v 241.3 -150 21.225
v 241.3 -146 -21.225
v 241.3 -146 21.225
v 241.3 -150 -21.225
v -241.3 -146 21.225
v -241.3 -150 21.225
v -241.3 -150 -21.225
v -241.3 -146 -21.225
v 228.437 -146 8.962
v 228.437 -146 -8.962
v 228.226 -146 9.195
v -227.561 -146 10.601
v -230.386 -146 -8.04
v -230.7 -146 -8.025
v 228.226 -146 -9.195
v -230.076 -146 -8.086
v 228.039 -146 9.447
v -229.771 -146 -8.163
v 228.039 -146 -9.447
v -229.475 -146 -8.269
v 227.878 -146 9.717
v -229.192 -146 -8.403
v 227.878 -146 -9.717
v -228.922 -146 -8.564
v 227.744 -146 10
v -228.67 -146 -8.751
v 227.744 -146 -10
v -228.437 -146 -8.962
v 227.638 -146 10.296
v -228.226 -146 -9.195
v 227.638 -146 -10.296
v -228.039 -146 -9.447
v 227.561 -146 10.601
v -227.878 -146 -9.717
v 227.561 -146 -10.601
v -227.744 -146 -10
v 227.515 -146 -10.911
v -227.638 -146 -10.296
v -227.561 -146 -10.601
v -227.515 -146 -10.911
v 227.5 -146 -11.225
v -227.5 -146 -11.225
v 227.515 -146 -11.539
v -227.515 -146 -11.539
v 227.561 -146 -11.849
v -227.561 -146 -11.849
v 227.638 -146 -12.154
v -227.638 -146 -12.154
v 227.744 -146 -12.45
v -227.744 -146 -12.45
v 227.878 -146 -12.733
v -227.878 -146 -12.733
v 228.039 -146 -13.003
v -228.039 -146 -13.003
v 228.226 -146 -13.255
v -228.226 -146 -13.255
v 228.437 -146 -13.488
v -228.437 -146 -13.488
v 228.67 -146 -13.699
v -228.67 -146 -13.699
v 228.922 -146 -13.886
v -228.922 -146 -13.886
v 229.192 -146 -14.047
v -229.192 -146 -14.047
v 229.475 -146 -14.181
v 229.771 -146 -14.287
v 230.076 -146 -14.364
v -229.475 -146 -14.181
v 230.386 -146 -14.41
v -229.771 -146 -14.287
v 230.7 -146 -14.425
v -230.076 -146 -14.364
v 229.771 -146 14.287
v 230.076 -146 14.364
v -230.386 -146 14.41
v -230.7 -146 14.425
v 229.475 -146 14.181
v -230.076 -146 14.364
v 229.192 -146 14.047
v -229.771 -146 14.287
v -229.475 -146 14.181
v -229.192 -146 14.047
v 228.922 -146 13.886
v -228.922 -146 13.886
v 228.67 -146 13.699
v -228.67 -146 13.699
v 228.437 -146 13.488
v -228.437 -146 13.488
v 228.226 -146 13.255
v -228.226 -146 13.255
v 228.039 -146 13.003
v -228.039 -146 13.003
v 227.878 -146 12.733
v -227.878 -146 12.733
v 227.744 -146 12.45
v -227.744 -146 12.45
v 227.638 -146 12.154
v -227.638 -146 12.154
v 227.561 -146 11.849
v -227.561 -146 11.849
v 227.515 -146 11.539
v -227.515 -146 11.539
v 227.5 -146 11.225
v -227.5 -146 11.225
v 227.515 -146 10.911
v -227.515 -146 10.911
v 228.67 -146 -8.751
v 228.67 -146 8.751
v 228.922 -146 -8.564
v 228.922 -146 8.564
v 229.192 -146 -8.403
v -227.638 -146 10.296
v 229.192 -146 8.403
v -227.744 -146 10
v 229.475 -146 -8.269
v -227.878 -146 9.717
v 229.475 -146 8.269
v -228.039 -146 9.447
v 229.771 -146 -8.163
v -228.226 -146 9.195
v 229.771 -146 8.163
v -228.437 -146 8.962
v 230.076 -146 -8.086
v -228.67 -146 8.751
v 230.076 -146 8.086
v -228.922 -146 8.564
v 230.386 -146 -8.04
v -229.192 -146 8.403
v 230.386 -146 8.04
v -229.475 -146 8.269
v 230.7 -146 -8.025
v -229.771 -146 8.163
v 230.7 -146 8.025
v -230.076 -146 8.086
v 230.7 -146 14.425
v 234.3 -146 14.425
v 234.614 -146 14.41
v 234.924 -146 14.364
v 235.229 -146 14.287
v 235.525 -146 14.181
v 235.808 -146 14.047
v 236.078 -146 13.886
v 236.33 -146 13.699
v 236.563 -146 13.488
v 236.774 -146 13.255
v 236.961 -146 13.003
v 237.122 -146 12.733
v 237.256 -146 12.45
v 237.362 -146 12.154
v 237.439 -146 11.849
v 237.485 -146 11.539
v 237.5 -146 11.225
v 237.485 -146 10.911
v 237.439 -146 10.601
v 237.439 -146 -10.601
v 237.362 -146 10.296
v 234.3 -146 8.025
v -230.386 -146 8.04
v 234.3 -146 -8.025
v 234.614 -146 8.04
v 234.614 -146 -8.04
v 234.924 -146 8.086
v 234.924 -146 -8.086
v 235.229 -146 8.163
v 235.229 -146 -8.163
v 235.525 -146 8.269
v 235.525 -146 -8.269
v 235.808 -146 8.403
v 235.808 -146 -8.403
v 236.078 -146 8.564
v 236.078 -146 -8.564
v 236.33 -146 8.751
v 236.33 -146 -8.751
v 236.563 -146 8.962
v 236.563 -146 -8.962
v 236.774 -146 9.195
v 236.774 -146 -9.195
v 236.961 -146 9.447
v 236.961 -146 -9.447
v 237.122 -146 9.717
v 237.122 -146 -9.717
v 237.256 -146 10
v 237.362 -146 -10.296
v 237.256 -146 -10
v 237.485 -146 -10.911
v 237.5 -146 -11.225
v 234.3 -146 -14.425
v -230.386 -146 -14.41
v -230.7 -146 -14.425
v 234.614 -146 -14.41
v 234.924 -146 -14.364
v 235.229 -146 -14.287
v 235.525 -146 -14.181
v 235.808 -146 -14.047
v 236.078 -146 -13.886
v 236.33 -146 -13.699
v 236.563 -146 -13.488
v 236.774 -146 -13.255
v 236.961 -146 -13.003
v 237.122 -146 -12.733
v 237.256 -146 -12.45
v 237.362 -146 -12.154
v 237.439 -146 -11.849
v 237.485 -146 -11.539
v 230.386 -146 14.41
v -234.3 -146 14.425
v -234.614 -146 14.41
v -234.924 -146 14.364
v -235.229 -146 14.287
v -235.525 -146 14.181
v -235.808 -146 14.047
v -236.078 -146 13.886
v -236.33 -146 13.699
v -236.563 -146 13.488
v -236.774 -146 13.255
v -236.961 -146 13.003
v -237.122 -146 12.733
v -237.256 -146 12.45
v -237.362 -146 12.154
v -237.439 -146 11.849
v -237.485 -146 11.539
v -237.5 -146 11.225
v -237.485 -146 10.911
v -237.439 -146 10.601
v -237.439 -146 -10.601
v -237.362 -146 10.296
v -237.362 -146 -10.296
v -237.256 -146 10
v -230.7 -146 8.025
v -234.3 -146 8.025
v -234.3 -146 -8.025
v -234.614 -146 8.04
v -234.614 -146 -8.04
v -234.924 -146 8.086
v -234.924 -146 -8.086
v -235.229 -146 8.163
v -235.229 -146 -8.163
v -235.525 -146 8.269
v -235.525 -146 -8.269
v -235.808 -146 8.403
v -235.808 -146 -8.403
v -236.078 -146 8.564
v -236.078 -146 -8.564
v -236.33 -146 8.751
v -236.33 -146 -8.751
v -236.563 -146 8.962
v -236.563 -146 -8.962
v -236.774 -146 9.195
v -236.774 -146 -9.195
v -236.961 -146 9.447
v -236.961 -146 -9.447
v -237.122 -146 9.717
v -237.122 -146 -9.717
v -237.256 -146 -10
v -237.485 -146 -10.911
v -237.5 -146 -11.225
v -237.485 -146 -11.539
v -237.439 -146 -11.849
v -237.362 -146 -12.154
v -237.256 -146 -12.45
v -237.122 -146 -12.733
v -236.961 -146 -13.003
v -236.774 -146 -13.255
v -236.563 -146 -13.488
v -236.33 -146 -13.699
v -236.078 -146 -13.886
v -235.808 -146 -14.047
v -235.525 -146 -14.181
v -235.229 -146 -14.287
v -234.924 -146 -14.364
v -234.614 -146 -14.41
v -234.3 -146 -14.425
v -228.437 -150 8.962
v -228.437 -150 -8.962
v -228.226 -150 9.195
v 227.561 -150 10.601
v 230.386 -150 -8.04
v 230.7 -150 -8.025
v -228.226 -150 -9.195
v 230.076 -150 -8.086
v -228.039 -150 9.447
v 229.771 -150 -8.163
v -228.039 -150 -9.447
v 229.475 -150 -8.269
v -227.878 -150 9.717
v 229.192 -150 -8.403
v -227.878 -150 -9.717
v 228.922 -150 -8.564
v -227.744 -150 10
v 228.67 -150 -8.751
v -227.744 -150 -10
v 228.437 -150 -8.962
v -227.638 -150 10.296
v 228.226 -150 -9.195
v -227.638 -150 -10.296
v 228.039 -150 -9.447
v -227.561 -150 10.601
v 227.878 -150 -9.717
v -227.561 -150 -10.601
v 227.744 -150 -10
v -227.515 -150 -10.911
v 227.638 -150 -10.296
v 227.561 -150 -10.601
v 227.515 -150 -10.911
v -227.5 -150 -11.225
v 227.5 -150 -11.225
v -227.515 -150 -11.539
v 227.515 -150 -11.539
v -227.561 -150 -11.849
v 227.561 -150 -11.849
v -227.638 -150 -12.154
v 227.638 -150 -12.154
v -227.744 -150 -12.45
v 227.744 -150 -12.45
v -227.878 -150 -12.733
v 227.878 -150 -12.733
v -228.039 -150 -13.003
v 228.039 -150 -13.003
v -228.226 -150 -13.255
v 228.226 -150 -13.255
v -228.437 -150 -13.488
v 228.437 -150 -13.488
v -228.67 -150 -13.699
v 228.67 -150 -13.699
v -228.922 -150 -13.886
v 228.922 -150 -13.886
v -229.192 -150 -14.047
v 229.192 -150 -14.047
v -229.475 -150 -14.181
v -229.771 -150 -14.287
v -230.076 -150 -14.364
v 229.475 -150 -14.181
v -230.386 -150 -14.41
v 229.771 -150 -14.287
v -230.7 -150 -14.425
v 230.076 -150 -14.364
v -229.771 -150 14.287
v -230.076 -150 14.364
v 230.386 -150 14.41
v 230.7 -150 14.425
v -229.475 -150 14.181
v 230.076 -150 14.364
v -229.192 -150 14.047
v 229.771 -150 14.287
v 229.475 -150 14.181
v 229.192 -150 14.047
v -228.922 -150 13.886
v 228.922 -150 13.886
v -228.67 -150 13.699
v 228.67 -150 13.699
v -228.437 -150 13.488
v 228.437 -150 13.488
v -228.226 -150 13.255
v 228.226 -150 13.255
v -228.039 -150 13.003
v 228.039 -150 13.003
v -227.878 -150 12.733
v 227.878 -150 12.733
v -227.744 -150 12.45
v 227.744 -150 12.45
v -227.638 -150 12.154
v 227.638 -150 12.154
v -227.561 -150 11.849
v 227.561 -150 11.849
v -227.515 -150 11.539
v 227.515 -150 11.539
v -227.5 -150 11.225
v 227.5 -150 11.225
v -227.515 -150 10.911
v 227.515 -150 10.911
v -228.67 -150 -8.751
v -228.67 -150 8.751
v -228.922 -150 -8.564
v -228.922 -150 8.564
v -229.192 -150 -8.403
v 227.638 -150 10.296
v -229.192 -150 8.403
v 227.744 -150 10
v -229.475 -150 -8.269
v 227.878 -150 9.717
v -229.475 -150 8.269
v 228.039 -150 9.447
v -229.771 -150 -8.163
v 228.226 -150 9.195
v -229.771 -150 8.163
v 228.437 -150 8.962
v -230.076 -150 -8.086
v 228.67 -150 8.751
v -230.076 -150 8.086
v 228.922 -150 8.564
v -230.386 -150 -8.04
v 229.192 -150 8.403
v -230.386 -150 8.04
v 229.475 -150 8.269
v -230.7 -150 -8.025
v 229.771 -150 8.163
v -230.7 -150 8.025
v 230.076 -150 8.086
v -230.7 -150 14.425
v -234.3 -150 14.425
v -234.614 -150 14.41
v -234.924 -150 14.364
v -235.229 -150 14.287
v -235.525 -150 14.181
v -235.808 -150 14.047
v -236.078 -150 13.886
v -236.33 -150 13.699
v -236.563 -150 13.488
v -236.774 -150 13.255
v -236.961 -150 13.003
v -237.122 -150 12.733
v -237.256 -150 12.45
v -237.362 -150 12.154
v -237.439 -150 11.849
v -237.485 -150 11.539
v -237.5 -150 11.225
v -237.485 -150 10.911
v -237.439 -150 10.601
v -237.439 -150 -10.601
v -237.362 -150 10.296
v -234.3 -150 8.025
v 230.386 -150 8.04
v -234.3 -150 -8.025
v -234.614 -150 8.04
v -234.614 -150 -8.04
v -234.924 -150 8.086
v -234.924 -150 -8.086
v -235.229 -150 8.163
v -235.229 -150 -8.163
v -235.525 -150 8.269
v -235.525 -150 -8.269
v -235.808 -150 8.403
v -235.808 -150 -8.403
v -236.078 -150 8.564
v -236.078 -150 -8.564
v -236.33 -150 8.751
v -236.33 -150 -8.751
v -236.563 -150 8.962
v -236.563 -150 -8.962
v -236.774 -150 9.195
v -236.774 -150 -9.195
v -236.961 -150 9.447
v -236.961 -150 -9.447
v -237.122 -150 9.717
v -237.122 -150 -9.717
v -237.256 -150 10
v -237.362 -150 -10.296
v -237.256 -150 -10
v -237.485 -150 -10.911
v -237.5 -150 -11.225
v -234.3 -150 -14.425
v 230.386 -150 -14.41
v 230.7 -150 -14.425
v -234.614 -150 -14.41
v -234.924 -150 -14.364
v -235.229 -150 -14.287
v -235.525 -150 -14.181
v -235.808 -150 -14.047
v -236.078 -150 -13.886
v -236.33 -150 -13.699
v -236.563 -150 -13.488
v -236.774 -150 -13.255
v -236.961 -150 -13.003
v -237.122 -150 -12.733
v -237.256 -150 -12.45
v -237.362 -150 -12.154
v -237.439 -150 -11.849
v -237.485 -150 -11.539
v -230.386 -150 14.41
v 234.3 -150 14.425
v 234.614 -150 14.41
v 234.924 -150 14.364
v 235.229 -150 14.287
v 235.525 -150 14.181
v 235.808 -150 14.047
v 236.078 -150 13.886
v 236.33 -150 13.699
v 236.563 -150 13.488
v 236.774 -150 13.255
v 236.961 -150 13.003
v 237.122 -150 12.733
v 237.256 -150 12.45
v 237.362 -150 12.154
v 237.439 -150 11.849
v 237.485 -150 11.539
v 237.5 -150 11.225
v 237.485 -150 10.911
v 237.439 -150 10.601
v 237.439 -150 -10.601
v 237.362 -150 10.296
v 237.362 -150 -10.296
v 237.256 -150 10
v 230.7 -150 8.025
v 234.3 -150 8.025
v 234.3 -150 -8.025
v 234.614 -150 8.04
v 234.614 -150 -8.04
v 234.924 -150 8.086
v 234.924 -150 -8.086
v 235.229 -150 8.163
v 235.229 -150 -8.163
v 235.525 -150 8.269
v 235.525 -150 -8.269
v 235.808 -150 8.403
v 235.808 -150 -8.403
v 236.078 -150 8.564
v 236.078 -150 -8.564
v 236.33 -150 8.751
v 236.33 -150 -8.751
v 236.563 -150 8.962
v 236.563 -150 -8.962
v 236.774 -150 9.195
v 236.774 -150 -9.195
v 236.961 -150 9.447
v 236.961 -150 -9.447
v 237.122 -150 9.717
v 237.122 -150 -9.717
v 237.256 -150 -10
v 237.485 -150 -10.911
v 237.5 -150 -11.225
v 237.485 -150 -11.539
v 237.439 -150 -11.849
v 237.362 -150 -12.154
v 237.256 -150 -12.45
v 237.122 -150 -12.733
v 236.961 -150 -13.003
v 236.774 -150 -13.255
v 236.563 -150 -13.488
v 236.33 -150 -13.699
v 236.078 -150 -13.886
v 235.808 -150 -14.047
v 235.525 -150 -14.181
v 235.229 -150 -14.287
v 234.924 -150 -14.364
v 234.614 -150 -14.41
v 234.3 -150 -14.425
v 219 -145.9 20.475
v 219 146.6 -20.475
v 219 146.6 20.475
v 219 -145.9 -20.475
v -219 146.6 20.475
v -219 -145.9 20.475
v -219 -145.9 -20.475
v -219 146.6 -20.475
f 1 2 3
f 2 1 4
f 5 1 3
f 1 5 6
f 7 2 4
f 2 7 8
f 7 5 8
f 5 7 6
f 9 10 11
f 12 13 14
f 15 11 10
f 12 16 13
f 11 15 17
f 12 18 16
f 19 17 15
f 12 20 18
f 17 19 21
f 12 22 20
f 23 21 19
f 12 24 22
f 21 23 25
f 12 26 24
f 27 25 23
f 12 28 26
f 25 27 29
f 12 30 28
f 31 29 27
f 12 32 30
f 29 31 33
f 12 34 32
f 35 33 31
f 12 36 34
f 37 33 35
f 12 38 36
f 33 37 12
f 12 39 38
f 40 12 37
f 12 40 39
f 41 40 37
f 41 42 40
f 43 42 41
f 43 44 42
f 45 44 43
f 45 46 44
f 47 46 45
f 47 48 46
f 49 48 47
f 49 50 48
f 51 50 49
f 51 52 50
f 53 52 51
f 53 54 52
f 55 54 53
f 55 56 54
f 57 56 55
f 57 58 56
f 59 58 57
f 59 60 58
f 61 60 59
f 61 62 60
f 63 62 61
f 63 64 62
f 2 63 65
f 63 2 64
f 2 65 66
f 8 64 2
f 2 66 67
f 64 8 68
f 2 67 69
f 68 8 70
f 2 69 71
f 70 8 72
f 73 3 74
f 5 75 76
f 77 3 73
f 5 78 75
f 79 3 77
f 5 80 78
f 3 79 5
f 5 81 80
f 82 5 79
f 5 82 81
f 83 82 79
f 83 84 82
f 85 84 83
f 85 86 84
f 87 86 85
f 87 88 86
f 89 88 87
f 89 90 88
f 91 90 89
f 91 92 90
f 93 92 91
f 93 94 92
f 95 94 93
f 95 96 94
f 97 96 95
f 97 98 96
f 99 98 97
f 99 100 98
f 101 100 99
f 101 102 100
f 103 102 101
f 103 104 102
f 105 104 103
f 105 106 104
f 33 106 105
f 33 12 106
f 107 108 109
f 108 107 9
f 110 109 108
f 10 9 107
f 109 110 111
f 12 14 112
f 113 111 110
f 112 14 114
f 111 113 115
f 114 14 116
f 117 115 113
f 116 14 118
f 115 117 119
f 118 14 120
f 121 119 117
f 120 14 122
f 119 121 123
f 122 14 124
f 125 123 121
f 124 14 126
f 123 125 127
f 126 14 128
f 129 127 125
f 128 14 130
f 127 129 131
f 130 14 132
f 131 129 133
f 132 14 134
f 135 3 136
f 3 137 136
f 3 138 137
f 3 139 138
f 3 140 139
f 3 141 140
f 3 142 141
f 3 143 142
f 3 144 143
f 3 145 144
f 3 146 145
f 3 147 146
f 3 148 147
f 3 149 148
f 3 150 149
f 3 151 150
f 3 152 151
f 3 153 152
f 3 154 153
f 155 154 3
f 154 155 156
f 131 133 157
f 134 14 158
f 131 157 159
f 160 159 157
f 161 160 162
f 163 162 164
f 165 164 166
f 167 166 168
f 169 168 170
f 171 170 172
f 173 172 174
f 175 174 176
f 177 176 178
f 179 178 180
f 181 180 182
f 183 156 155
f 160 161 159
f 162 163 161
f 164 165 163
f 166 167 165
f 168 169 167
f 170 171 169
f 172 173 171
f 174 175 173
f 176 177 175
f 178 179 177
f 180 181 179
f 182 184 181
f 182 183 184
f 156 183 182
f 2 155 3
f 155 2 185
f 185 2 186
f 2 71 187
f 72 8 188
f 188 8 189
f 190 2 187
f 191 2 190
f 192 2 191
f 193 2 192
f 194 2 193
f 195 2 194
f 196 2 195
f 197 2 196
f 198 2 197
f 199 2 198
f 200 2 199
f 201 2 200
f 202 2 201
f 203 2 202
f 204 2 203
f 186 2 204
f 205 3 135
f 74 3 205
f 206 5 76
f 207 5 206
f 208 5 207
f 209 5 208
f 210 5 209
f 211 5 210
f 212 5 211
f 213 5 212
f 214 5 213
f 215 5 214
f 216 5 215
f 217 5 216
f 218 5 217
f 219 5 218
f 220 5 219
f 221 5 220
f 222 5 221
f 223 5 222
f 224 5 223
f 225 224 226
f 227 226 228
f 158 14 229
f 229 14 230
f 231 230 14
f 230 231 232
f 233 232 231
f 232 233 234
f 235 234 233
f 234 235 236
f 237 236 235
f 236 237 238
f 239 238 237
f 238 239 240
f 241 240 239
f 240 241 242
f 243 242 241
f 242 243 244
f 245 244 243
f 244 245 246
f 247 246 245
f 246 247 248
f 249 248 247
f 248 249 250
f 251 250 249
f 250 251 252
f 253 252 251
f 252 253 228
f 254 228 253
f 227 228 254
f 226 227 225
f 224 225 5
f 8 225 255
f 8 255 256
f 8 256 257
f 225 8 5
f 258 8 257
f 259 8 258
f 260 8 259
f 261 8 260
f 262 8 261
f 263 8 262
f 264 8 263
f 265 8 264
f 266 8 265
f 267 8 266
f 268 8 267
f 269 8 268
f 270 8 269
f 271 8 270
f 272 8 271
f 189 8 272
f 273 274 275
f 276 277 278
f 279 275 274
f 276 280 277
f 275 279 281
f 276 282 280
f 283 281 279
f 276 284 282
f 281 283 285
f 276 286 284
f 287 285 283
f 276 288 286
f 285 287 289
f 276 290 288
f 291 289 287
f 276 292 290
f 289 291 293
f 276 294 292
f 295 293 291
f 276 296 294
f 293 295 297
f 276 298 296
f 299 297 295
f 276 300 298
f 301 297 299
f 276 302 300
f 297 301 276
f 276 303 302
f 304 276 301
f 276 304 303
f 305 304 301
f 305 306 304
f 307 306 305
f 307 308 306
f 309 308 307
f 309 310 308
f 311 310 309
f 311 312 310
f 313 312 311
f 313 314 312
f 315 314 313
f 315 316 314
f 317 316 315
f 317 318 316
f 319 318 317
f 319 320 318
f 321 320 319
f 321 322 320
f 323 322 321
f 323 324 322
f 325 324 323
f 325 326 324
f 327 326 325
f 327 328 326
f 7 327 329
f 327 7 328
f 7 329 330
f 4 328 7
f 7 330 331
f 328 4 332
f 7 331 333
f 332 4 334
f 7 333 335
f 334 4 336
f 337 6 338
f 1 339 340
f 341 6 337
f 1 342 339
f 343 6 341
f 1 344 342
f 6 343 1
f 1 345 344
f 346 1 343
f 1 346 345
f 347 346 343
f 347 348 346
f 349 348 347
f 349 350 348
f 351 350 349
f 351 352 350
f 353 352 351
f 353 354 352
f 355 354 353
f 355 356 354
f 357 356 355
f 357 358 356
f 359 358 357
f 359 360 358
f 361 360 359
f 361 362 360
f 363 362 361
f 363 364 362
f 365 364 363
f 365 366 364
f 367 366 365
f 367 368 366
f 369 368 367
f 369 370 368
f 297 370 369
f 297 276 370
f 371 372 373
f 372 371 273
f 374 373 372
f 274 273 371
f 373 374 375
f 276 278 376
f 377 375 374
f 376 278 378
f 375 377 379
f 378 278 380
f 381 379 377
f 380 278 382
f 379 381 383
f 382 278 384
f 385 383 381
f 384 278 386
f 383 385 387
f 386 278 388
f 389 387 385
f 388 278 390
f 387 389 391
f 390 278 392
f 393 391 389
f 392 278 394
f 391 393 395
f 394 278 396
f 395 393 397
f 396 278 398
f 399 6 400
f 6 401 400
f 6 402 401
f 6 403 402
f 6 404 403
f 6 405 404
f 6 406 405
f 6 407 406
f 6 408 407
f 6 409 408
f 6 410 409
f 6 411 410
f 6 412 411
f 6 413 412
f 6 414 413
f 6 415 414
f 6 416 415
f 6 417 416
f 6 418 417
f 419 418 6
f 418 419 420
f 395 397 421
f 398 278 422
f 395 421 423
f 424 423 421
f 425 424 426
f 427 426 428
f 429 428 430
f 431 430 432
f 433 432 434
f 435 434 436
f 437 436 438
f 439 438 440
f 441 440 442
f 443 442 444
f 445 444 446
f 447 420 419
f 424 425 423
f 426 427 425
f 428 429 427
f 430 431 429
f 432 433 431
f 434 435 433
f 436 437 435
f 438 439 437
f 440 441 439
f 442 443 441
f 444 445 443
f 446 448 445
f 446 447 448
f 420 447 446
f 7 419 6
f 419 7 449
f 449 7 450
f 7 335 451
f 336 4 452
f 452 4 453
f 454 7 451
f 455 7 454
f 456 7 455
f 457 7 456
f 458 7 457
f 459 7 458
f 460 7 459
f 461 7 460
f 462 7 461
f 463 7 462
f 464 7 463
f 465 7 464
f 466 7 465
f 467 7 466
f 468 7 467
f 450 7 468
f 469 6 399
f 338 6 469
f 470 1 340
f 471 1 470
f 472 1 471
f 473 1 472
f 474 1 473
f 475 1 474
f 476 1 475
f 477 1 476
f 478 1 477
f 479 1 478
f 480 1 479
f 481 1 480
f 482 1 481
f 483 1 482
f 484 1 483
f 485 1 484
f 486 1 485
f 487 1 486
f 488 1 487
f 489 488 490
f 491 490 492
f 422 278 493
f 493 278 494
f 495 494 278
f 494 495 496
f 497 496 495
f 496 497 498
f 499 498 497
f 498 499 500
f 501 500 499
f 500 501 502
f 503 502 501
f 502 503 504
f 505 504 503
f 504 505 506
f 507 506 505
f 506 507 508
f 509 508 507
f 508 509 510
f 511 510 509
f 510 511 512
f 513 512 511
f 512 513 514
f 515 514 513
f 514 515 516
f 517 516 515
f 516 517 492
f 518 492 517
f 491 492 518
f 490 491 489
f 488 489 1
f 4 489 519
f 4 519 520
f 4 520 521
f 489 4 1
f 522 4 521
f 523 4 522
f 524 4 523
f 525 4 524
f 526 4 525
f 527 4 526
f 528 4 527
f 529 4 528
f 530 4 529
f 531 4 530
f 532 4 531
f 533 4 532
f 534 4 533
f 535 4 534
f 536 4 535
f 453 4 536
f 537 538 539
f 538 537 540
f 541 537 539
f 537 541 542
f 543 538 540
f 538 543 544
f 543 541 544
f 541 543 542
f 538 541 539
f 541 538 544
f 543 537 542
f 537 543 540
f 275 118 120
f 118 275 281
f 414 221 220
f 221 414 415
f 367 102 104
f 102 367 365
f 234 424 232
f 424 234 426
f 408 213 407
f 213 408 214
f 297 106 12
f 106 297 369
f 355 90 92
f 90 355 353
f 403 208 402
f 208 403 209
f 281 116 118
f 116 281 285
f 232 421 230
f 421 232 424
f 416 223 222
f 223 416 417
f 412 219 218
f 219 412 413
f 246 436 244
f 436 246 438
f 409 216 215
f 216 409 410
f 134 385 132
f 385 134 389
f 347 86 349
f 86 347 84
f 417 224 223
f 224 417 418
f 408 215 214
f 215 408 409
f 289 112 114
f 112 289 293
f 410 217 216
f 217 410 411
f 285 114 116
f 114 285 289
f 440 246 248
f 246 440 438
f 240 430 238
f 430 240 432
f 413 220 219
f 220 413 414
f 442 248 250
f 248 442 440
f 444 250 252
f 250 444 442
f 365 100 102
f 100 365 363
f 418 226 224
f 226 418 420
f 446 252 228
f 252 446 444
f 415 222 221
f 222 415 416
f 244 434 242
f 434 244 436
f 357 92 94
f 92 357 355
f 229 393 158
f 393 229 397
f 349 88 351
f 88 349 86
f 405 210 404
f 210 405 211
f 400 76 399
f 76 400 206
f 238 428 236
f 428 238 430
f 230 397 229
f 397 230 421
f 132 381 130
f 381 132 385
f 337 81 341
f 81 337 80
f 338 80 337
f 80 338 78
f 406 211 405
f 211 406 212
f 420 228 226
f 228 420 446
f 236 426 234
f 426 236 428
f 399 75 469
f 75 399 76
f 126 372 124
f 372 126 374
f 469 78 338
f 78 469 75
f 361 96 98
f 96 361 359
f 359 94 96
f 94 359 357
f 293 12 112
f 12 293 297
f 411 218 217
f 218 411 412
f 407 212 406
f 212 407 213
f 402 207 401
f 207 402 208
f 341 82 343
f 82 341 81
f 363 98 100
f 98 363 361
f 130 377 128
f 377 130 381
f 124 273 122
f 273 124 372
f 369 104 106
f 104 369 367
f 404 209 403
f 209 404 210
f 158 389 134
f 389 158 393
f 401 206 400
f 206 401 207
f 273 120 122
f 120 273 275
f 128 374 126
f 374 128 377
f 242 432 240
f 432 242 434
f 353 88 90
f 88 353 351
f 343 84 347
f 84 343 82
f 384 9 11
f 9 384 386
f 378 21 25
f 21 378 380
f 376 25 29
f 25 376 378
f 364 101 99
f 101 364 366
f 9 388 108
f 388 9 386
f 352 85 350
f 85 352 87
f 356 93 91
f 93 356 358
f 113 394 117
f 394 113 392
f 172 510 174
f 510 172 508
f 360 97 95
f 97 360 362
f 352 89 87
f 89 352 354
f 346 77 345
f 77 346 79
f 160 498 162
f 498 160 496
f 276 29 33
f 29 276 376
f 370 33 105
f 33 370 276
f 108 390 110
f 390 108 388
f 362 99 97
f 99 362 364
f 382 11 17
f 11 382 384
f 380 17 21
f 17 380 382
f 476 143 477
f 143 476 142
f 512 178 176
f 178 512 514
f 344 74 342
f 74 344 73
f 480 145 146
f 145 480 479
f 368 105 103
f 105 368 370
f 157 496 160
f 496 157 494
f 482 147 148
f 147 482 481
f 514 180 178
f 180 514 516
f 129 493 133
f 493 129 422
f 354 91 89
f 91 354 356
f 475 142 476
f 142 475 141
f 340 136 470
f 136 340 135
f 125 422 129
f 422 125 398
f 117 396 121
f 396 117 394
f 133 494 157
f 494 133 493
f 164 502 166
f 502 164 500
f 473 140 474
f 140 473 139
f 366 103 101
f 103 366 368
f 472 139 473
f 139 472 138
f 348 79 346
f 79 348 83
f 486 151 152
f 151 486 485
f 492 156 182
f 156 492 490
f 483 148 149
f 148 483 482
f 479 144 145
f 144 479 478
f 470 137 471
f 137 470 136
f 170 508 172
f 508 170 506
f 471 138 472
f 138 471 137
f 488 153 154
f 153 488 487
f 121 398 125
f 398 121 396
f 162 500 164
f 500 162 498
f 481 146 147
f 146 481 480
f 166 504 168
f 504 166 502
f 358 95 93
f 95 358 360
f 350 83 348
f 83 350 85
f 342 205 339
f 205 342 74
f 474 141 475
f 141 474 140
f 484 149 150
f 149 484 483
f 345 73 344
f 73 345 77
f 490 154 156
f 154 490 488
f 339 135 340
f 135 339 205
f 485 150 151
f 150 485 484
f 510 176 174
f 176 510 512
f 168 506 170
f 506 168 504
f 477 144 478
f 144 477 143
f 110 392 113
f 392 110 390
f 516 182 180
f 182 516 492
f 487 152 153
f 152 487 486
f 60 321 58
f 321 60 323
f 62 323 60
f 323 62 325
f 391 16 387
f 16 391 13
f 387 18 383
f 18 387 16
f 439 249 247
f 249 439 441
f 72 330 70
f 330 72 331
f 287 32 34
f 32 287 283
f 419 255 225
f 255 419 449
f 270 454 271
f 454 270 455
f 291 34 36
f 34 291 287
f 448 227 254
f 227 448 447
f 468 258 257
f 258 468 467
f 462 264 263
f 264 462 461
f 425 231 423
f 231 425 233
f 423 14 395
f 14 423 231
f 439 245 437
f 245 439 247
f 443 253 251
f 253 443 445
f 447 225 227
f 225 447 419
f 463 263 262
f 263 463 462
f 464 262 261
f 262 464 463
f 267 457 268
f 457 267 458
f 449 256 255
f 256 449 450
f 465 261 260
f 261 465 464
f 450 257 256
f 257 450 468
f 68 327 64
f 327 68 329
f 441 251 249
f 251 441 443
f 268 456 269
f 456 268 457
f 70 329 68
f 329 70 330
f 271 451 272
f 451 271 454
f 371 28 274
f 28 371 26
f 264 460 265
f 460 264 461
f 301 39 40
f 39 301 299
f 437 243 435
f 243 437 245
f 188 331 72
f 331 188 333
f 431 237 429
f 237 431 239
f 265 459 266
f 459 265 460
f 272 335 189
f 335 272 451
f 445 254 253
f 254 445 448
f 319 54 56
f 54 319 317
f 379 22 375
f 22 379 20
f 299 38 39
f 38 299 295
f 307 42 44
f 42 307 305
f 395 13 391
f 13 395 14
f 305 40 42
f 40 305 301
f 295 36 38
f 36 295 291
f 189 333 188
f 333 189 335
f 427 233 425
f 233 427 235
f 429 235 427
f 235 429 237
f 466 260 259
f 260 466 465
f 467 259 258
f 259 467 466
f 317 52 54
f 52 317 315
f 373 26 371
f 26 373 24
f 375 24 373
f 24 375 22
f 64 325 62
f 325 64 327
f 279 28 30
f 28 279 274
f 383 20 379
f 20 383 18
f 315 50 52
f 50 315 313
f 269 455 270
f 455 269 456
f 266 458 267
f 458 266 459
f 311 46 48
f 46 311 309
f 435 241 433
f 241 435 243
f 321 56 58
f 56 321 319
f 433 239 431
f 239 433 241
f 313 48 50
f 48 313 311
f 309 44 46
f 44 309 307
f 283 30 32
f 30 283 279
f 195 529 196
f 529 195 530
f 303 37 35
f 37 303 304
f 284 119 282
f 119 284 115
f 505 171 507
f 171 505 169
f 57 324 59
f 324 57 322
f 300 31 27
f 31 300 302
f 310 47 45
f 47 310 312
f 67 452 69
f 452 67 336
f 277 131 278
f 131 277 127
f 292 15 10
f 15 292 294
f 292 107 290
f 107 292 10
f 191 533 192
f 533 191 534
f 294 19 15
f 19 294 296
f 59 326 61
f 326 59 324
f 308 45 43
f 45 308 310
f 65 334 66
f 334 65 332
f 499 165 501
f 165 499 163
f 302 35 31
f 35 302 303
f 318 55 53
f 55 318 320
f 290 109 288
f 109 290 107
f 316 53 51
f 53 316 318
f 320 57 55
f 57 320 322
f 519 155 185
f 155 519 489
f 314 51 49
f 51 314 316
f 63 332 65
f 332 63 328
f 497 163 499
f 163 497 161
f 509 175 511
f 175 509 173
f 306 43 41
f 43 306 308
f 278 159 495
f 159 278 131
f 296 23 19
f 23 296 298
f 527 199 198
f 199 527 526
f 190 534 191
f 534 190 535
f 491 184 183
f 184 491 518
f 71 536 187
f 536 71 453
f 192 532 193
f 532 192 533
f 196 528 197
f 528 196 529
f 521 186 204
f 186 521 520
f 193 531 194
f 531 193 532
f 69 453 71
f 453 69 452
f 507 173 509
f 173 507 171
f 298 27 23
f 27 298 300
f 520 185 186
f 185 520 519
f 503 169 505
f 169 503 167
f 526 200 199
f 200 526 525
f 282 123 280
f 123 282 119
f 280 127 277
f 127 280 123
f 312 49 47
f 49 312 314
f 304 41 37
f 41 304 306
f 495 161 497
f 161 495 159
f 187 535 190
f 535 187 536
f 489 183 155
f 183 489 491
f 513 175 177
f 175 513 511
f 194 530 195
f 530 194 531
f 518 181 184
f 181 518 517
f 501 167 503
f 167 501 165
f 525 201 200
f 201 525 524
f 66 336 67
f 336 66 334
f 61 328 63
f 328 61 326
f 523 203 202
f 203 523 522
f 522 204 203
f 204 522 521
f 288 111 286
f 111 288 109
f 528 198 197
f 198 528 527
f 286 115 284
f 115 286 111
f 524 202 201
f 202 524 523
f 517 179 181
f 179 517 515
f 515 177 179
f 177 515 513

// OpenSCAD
// ============================================================================
// Atom Lithography Machine — Parametric OpenSCAD Module (S3.2-03)
// ============================================================================
// part_id           : S3.2-03
// parent_bom_id     : S3.2
// subsystem         : S3
// part_name         : Dedektor ters-gerilim HV filtre ve guard-ring dagitim karti (Exp127)
// material          : Al 6061
// temp_stage        : 300 K
// vacuum_grade      : UHV / Atmosfer
// tolerance         : ±1 mV
// computed_mass_kg  : 2.59922
// envelope_mm       : 482.600 x 335.000 x 42.450
// design_maturity   : M0_M1_DETAILED_CAD_DESIGN_ONLY
// no_lab_measurement: true
// iec61508_certified: false
// semi_s2_certified : false
// Units: millimeters (mm)
// ============================================================================

$fn = 64;

// Nominal bounding envelope parameters (mm)
bbox_x = 482.6000;
bbox_y = 335.0000;
bbox_z = 42.4500;

// Part-specific parametric dimensions
n_hv_modules = 4;
hv_pcb_x_mm = 75.0;
hv_pcb_y_mm = 110.0;
hv_air_slot_mm = 54.0;
rack_u_height = 1;

// Interface / port parameters (mm)

module part_S3_2_03() {
  difference() {
    union() {
      // 19-inch EIA-310 1U front faceplate (482.6 x 42.5 mm, facing -Y)
      translate([0.000, -148.000, 0.000]) cube([482.600, 4.000, 42.450], center=true);
      // Hollow EMI-shielded chassis body
      translate([0.000, 0.350, 0.000]) cube([438.000, 292.500, 40.950], center=true);
    }
    // EIA-310 upper-left rack ear slot
    translate([-232.500, -148.000, 11.225]) rotate([90.000, 0.000, 0.000]) {
      hull() {
        translate([-1.800, 0, 0]) cylinder(d=6.400, h=8.000, center=true);
        translate([1.800, 0, 0]) cylinder(d=6.400, h=8.000, center=true);
      }
    }
    // EIA-310 upper-right rack ear slot
    translate([232.500, -148.000, 11.225]) rotate([90.000, 0.000, 0.000]) {
      hull() {
        translate([-1.800, 0, 0]) cylinder(d=6.400, h=8.000, center=true);
        translate([1.800, 0, 0]) cylinder(d=6.400, h=8.000, center=true);
      }
    }
    // EIA-310 lower-left rack ear slot
    translate([-232.500, -148.000, -11.225]) rotate([90.000, 0.000, 0.000]) {
      hull() {
        translate([-1.800, 0, 0]) cylinder(d=6.400, h=8.000, center=true);
        translate([1.800, 0, 0]) cylinder(d=6.400, h=8.000, center=true);
      }
    }
    // EIA-310 lower-right rack ear slot
    translate([232.500, -148.000, -11.225]) rotate([90.000, 0.000, 0.000]) {
      hull() {
        translate([-1.800, 0, 0]) cylinder(d=6.400, h=8.000, center=true);
        translate([1.800, 0, 0]) cylinder(d=6.400, h=8.000, center=true);
      }
    }
  }
}

// World assembly mounting transform (global machine frame, mm / deg):
// translate([1480.000, -260.000, 545.675]) rotate([0.000, 0.000, 0.000]) part_S3_2_03();

part_S3_2_03();
